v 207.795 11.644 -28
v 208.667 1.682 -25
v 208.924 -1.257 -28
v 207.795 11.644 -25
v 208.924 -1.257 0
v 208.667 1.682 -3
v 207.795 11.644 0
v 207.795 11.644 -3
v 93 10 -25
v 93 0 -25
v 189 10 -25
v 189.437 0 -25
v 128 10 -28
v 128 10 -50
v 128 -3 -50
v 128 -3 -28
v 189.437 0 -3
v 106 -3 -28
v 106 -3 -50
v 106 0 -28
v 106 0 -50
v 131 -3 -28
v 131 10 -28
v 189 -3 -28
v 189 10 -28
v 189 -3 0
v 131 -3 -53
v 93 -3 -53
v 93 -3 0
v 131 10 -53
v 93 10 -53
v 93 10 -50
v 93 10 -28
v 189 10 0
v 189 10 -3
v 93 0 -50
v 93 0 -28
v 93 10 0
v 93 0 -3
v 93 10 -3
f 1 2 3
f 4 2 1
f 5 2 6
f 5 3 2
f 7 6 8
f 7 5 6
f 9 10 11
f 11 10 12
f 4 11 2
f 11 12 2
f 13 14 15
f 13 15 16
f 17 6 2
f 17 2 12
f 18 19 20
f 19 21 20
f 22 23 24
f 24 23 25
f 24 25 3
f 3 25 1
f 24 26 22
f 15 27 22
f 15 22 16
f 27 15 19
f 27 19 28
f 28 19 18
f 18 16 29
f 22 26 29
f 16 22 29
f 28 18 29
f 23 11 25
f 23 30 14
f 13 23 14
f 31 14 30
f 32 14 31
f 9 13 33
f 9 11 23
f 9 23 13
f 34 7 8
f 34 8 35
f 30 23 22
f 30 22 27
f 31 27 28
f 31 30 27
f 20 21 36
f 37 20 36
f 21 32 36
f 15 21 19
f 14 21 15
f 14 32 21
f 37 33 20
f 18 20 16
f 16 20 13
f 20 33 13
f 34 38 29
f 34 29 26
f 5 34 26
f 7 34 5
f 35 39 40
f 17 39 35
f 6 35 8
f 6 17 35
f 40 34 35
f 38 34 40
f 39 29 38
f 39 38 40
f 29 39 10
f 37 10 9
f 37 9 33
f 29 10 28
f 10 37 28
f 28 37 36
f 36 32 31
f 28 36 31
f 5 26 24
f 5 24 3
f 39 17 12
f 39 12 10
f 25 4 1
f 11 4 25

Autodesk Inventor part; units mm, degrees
ref_plane "YZ Plane" through (0, 0, 0) normal (1, 0, 0) x (0, 1, 0)
ref_plane "XZ Plane" through (0, 0, 0) normal (0, 1, 0) x (-1, 0, 0)
sketch "Esboço1" plane through (0, 0, 0) normal (0, 1, 0) x (-1, 0, 0)
  line L0 (-93, -3) -> (0, -3)
  line L1 (0, -25) -> (-58, -25)
  line L2 (-93, 0) -> (-93, -28)
  line L3 (-93, -28) -> (-83, -28)
  line L4 (-55, -28) -> (0, -28)
  line L5 (0, -28) -> (0, 0)
  line L6 (0, 0) -> (-93, 0)
  line L7 (-55, -28) -> (-55, -53)
  line L8 (-55, -53) -> (-93, -53)
  line L9 (-93, -53) -> (-93, -50)
  line L10 (-93, -50) -> (-58, -50)
  line L11 (-58, -50) -> (-58, -25)
  arc A0 (-83, -50) -> (-58, -25) centre (-83, -25) ccw
  arc A1 (-83, -28) -> (-80, -25) centre (-83, -25) ccw
  line L12 (-93, -25) -> (-80, -25)
  line L13 (0, 0) -> (3, 0)
  line L14 (3, 0) -> (3, -28)
  line L15 (3, -28) -> (0, -28)
  line L16 (-83, -28) -> (-83, -25)
  line L17 (-93, -50) -> (-93, -28)
  line L18 (0, -3) -> (3, -3)
  line L19 (0, -25) -> (3, -25)
  line L20 (-93, -3) -> (-186, -3)
  line L21 (-186, -25) -> (-128, -25)
  line L22 (-131, -28) -> (-186, -28)
  line L23 (-186, -28) -> (-186, 0)
  line L24 (-186, 0) -> (-93, 0)
  line L25 (-131, -28) -> (-131, -53)
  line L26 (-131, -53) -> (-93, -53)
  line L27 (-93, -50) -> (-128, -50)
  line L28 (-128, -50) -> (-128, -25)
  line L29 (-186, 0) -> (-189, 0)
  line L30 (-189, 0) -> (-189, -28)
  line L31 (-189, -28) -> (-186, -28)
  line L32 (-186, -3) -> (-189, -3)
  line L33 (-186, -25) -> (-189, -25)
  line L34 (-93, -28) -> (-128, -28)
  line L35 (-93, -25) -> (-128, -25)
  line L36 (-106, -50) -> (-106, -28)
  point P0 (-93, -14)
  point P1 (-93, -51.5)
  point P2 (-83, -28)
  dimension "d7" = 22
  dimension "d9" = 3
  dimension "d10" = 3
  dimension "d13" = 3
  dimension "d14" = 3
  dimension "d16" = 22
  dimension "d20" = 22
  dimension "d21" = 80
  dimension "d29" = 3
  dimension "d31" = 10
  dimension "d39" = 22
extrude "Extrusão1" add sketch "Esboço1" against normal blind 3 contours L20 L23 L24 L2 | L2 L35 L21 L23 L20 | L2 L34 L28 L35 | L32 L30 L29 L23 | L23 L33 L30 L32 | L17 L27 L36 L34 | L28 L27 L9 L26 L25 L22 L23 L21 | L23 L31 L30 L33
extrude "Extrusão2" add sketch "Esboço1" along normal blind 10 contours L20 L23 L24 L2 | L2 L34 L28 L35 | L32 L30 L29 L23 | L28 L27 L9 L26 L25 L22 L23 L21 | L23 L31 L30 L33
sketch "Esboço2" plane through (93, -3, 0) normal (0, 0, 1) x (1, 0, 0)
  line L0 (0, 13) -> (96, 13) projected
  line L1 (96, 0) -> (0, 0) projected
  line L2 (96, 0) -> (115.9239, 1.7431)
  line L3 (96, 0) -> (116, 0) construction
  line L4 (115.9239, 1.7431) -> (114.7952, 14.6444)
  line L5 (114.7952, 14.6444) -> (96, 13)
  line L6 (96, 0) -> (96, 13) projected
  line L7 (96, 0) -> (96, 13)
  dimension "d32" = 20
  dimension "d33" = 5
extrude "Extrusão4" add sketch "Esboço2" against normal up to surface (28 mm away)
ref_plane "Plano de trabalho1" through (131, -3, -14) normal (0, 0, -1) x (-1, 0, 0)
sketch "Esboço3" plane through (131, -3, -14) normal (0, 0, -1) x (-1, 0, 0)
  line L0 (-76.7952, 14.6444) -> (-58, 13) projected
  line L1 (38, 13) -> (-58, 13) projected
  line L2 (-77.6667, 4.6824) -> (-58.4366, 3)
  line L3 (-58.4366, 3) -> (38, 3)
  line L4 (-77.9239, 1.7431) -> (-76.7952, 14.6444) projected
  line L5 (-76.7952, 14.6444) -> (-77.6667, 4.6824)
  line L6 (-58, 3) -> (-58, 13) projected
  line L7 (-76.7952, 14.6444) -> (-58, 13)
  line L8 (-58, 13) -> (-58, 3)
  dimension "d40" = 10
extrude "Extrusão5" cut sketch "Esboço3" along normal mid plane 22
equation "\"d9\" = mdf"
equation "\"d10\" = mdf"
equation "\"d13\" = mdf"
equation "\"d14\" = mdf"
equation "\"mdf\" = 3"
equation "\"margem\" = 1"
properties part number "Trilho 5 min"
